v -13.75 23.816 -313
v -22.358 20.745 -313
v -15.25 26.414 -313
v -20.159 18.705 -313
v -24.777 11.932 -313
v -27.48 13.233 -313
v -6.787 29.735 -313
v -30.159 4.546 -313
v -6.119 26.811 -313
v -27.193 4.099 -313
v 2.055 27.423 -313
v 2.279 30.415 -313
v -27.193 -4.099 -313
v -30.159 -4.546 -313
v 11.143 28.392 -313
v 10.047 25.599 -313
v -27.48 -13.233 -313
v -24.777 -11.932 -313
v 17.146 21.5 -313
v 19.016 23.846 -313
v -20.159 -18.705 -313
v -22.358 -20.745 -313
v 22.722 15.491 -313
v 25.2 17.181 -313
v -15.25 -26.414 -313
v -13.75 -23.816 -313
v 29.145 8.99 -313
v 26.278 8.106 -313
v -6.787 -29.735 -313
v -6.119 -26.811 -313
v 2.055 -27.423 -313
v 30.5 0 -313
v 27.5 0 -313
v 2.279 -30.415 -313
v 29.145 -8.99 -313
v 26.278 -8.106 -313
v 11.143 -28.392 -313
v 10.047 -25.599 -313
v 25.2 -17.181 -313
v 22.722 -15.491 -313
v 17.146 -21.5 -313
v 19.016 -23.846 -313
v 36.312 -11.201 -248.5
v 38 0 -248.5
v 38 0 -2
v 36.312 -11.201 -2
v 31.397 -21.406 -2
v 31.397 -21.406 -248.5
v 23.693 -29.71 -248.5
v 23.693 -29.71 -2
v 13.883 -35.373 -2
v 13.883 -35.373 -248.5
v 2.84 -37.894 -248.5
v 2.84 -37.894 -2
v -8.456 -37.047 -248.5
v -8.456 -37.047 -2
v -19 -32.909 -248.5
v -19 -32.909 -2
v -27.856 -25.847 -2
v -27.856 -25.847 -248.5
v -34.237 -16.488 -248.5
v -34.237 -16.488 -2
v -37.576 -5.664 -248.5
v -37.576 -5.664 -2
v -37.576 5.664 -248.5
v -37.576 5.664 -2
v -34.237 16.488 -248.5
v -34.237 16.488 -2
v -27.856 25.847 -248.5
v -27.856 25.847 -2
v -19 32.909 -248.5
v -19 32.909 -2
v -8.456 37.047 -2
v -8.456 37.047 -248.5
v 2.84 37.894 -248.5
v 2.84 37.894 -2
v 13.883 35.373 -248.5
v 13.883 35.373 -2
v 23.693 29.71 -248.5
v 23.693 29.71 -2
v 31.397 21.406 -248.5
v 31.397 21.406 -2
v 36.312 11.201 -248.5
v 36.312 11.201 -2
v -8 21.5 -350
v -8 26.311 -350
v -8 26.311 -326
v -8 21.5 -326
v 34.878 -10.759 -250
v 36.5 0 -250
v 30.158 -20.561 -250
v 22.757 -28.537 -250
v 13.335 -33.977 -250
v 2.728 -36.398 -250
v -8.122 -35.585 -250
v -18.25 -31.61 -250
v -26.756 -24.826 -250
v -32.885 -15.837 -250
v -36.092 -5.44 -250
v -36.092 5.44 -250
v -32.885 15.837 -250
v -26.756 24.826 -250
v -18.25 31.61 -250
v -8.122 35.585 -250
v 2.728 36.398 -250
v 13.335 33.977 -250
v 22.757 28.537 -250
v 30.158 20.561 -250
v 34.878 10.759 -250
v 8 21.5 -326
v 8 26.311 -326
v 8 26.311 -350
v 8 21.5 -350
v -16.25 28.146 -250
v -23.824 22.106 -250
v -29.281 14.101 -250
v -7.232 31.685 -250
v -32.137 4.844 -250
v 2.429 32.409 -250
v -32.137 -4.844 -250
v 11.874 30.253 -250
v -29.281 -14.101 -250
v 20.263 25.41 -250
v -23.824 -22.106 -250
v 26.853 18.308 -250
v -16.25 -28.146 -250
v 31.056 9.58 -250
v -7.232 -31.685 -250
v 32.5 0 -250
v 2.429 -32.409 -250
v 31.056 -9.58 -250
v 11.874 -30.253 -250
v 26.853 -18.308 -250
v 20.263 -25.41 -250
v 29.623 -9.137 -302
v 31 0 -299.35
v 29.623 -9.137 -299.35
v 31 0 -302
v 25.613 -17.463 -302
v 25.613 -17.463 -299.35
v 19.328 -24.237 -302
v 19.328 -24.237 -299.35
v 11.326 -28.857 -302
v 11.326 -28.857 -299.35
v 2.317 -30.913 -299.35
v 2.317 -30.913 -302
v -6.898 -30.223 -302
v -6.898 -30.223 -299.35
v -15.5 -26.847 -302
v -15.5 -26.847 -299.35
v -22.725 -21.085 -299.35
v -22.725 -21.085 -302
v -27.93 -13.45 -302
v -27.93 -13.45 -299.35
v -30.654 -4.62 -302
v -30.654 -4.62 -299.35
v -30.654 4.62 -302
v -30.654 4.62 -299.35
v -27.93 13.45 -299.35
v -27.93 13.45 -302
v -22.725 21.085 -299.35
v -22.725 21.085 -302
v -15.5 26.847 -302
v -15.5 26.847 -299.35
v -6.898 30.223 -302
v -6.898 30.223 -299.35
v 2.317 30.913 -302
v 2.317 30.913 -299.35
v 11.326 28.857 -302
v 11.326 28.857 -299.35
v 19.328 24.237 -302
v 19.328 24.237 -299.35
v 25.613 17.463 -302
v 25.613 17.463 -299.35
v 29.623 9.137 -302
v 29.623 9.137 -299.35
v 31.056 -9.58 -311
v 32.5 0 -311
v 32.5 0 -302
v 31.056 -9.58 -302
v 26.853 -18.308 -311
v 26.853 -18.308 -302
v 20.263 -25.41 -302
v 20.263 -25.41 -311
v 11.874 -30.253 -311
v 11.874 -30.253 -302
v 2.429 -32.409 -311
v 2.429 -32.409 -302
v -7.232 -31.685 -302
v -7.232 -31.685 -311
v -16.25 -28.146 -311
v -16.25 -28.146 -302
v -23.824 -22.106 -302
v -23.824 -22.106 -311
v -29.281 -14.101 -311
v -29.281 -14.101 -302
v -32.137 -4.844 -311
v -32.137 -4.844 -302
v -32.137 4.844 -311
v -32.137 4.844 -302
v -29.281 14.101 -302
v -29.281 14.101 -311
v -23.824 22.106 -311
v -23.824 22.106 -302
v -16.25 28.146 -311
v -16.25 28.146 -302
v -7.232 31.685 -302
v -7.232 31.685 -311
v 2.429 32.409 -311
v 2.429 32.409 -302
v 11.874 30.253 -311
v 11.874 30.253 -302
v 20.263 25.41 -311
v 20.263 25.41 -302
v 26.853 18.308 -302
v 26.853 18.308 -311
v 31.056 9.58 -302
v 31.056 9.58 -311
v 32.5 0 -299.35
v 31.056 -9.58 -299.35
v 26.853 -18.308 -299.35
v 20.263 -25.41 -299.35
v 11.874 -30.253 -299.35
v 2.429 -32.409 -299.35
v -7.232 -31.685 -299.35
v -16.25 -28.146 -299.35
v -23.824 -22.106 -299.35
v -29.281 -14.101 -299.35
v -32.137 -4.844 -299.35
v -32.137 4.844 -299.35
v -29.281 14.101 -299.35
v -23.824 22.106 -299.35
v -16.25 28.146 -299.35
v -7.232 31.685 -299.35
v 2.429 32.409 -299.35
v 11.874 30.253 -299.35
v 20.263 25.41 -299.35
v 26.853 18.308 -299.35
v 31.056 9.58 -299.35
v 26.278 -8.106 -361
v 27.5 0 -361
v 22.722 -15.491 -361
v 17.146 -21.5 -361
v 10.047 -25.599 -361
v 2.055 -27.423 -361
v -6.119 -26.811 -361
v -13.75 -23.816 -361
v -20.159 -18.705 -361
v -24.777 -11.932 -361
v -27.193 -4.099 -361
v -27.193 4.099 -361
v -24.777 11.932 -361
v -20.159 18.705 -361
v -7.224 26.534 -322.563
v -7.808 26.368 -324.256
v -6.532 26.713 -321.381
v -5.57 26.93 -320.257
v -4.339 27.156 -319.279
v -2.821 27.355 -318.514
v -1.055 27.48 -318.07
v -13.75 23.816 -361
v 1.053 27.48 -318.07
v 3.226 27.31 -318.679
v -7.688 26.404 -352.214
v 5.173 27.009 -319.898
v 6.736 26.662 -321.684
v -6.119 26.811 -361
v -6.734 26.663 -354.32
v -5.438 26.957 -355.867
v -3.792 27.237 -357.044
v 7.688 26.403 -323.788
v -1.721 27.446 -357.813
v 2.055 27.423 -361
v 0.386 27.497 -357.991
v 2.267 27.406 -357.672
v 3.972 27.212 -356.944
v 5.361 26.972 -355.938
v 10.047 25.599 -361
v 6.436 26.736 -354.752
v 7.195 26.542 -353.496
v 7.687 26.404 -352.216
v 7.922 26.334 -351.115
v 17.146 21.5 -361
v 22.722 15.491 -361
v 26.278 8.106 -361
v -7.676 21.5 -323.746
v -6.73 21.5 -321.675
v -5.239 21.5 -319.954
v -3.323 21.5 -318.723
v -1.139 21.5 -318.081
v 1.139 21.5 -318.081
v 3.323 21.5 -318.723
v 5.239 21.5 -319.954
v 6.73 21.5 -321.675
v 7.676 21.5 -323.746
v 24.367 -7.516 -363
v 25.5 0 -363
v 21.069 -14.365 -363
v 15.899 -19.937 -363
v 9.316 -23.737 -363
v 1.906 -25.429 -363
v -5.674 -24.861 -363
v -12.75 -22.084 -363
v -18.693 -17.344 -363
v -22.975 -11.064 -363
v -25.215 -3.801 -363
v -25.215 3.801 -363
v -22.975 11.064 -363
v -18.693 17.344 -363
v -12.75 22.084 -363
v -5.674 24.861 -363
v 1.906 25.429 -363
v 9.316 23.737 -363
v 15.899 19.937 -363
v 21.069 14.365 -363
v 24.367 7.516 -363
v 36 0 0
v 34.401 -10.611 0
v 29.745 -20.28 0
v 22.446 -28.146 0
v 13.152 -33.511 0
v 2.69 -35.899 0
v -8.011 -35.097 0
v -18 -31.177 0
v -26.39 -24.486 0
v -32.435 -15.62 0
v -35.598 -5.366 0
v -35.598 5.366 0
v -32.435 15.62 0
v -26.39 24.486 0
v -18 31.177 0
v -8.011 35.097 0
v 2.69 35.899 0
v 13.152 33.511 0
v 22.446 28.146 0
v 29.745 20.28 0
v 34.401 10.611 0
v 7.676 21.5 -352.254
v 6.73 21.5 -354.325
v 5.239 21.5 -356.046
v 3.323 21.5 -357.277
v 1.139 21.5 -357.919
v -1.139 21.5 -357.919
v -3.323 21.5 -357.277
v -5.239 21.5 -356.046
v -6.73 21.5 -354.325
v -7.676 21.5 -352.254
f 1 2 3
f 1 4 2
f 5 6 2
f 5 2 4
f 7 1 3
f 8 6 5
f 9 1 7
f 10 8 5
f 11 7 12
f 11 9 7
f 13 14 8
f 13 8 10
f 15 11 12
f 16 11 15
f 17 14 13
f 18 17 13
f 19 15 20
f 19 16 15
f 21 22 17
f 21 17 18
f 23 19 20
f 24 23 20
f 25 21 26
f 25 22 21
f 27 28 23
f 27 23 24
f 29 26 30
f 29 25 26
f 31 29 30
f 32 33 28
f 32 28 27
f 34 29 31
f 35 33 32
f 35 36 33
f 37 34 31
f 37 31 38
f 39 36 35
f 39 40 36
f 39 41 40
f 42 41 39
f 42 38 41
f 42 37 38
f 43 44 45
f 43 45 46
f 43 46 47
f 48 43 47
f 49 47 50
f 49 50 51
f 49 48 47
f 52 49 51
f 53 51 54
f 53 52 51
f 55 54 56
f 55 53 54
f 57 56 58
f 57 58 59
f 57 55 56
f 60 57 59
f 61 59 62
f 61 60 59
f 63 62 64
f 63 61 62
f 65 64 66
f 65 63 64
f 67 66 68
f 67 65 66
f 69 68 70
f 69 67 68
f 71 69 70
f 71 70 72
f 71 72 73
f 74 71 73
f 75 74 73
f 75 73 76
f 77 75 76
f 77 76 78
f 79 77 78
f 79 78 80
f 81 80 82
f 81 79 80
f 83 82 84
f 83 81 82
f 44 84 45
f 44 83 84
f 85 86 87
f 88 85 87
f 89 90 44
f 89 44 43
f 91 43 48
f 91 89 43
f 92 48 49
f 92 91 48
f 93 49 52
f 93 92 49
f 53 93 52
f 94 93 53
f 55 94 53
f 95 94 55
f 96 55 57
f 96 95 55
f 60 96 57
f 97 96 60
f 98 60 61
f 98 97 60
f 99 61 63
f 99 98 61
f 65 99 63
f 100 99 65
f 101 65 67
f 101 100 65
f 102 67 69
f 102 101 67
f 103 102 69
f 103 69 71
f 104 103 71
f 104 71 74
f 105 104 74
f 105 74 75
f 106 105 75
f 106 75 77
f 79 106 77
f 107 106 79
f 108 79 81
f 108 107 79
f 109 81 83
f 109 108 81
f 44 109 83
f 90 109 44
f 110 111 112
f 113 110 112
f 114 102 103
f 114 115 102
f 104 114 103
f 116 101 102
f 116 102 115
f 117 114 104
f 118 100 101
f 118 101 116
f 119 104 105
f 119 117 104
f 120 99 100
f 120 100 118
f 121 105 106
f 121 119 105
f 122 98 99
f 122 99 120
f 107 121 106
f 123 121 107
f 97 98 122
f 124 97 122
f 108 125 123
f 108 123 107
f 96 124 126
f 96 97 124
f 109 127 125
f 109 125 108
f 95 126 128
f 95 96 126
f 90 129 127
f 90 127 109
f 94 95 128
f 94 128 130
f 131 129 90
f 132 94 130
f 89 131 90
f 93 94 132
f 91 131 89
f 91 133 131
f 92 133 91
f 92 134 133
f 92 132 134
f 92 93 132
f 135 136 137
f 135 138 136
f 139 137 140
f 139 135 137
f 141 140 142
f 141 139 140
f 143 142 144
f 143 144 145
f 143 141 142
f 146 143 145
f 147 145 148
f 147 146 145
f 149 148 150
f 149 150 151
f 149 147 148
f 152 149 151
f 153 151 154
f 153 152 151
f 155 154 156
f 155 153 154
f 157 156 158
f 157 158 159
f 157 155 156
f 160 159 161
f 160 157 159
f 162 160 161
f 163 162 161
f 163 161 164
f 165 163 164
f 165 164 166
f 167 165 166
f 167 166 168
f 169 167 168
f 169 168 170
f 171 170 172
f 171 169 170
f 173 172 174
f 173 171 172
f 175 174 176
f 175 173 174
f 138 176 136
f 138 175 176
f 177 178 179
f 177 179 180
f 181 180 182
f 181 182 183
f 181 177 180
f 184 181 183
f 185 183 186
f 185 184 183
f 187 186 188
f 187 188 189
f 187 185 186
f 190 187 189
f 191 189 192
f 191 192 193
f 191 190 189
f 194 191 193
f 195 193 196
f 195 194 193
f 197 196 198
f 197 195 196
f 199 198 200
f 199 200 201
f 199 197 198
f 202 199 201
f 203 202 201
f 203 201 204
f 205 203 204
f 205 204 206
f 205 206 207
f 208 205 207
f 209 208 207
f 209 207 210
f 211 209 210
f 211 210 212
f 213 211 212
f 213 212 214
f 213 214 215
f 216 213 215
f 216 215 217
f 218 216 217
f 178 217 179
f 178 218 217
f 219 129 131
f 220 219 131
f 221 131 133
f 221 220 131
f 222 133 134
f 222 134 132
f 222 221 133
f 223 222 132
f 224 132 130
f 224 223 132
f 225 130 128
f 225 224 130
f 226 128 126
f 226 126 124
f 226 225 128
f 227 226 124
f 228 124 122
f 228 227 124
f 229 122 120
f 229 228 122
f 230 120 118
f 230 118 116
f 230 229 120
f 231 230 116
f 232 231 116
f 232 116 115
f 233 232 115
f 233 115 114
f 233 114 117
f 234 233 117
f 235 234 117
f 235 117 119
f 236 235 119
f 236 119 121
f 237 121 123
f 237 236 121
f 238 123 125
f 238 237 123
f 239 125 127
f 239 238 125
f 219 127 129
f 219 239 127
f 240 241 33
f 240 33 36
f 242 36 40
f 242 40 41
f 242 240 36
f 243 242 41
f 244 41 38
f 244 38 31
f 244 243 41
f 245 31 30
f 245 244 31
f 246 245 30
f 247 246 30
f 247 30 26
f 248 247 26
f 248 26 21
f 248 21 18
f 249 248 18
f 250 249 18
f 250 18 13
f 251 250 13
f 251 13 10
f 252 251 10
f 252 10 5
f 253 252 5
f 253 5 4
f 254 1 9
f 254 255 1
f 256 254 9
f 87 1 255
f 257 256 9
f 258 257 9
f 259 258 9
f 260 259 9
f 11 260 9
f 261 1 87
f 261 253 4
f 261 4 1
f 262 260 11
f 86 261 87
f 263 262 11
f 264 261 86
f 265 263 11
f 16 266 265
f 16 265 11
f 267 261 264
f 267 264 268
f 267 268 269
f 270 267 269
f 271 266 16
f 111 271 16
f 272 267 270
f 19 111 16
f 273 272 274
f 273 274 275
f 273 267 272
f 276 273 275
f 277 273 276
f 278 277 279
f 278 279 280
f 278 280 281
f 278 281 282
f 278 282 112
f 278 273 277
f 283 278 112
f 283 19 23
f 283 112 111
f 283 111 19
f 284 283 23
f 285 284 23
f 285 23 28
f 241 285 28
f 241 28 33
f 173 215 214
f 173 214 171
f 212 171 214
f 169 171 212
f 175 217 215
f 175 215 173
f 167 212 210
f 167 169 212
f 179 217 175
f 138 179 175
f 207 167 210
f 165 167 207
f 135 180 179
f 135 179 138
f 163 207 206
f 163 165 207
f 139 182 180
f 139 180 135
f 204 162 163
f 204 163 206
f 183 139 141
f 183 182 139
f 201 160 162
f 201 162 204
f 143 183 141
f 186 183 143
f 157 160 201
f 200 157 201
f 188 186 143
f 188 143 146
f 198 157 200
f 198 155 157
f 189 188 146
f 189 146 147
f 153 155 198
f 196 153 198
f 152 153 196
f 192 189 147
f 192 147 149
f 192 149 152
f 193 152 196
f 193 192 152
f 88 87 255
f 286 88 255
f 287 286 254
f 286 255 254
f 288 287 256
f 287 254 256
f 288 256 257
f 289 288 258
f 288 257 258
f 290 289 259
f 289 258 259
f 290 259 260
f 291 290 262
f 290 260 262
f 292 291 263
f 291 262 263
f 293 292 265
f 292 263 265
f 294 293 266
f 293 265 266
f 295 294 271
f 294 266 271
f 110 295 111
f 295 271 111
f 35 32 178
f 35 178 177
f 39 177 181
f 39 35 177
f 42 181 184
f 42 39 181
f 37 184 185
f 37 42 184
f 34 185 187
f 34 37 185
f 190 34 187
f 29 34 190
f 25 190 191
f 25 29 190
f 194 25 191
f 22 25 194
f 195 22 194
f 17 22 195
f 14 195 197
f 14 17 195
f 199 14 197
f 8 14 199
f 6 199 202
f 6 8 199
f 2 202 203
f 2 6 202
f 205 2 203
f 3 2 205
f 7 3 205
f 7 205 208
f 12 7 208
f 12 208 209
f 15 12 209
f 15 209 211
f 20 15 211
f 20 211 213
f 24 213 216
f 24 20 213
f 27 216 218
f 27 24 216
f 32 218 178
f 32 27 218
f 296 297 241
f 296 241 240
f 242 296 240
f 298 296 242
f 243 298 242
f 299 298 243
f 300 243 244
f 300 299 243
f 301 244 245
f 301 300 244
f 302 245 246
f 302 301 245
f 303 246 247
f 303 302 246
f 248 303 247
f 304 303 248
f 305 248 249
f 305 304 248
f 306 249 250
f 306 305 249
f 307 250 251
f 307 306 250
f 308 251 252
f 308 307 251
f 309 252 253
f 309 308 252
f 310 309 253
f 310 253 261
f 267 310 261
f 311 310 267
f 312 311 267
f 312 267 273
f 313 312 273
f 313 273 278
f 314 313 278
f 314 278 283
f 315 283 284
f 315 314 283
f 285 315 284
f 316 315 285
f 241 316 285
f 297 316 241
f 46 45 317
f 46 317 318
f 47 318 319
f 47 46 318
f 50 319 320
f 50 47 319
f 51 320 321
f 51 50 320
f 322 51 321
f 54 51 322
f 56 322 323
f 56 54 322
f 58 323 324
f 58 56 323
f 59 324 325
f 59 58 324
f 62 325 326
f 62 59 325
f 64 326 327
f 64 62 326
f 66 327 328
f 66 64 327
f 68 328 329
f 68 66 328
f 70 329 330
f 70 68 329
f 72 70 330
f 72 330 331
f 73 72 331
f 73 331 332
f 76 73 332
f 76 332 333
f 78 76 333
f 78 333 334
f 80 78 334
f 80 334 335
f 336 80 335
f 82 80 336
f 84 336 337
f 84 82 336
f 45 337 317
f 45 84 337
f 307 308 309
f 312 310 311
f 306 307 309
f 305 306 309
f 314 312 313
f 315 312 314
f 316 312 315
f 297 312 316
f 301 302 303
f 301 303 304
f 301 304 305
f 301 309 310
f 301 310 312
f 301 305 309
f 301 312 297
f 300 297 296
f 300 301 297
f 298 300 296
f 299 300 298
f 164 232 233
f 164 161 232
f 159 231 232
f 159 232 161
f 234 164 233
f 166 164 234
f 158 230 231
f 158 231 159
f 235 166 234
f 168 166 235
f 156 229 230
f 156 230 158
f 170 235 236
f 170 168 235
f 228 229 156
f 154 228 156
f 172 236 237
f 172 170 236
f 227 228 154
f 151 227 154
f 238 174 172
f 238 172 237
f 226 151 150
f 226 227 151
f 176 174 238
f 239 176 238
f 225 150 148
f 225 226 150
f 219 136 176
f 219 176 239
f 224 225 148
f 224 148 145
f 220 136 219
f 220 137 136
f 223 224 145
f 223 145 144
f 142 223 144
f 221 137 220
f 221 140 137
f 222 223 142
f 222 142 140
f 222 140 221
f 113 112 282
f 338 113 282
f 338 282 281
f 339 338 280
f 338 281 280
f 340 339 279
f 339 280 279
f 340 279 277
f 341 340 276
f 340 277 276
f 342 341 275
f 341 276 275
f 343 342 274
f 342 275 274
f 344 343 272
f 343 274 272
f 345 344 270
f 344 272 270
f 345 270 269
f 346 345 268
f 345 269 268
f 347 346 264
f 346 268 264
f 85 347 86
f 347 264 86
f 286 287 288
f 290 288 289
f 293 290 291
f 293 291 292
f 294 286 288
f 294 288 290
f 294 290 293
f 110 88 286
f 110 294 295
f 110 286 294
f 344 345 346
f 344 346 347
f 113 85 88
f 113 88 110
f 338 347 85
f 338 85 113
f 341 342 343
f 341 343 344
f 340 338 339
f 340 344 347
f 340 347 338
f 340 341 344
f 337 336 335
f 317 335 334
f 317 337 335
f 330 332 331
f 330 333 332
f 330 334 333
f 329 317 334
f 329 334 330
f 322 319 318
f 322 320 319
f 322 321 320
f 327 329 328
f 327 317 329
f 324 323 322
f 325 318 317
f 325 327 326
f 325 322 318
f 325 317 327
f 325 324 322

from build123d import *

# Parameters (mm, degrees)
CHAMFER_1_SIZE      = 2
CHAMFER_2_SIZE      = 1.5
CUT_EXTRUDE_1_DEPTH = 6
CHAMFER_3_SIZE      = 2


with BuildPart() as part:
    # Эскиз1 → Повернуть1 (revolve)
    with BuildSketch(Plane(origin=(0, 0, 0), x_dir=(0, 0, -1), z_dir=(1, 0, 0)), mode=Mode.PRIVATE) as revolve_1_sk:
        Polygon((0, 0), (0, 38), (250, 38), (250, 32.5), (299.35, 32.5), (299.35, 31), (302, 31), (302, 32.5), (313, 32.5), (313, 27.5), (363, 27.5), (363, 0), align=None)
    revolve(revolve_1_sk.sketch.rotate(Axis((0, 0, 0), (0, 0, -1)), 90), axis=Axis((0, 0, 0), (0, 0, -1)))

    # Фаска1
    chamfer_1_edges = [part.edges().sort_by_distance(p)[0] for p in [
        (-38, 0, 0),
        (-27.5, 0, -363),
    ]]
    chamfer(chamfer_1_edges, length=CHAMFER_1_SIZE)

    # Фаска2
    chamfer_2_edges = [part.edges().sort_by_distance(p)[0] for p in [
        (-38, 0, -250),
    ]]
    chamfer(chamfer_2_edges, length=CHAMFER_2_SIZE)

    # Эскиз8 → Вырез-Вытянуть1 (cut)
    with BuildSketch(Plane(origin=(-6.6, 27.5, -280), x_dir=(-1, 0, 0), z_dir=(0, -1, 0))):
        with BuildLine():
            Line((1.4, 70), (1.4, 46))
            ThreePointArc((1.4, 46), (-6.6, 38), (-14.6, 46))
            Line((-14.6, 46), (-14.6, 70))
            ThreePointArc((-14.6, 70), (-6.6, 78), (1.4, 70))
        make_face()
    extrude(amount=CUT_EXTRUDE_1_DEPTH, mode=Mode.SUBTRACT)

    # Фаска3
    chamfer_3_edges = [part.edges().sort_by_distance(p)[0] for p in [
        (-32.5, 0, -313),
    ]]
    chamfer(chamfer_3_edges, length=CHAMFER_3_SIZE)


solid = part.part
